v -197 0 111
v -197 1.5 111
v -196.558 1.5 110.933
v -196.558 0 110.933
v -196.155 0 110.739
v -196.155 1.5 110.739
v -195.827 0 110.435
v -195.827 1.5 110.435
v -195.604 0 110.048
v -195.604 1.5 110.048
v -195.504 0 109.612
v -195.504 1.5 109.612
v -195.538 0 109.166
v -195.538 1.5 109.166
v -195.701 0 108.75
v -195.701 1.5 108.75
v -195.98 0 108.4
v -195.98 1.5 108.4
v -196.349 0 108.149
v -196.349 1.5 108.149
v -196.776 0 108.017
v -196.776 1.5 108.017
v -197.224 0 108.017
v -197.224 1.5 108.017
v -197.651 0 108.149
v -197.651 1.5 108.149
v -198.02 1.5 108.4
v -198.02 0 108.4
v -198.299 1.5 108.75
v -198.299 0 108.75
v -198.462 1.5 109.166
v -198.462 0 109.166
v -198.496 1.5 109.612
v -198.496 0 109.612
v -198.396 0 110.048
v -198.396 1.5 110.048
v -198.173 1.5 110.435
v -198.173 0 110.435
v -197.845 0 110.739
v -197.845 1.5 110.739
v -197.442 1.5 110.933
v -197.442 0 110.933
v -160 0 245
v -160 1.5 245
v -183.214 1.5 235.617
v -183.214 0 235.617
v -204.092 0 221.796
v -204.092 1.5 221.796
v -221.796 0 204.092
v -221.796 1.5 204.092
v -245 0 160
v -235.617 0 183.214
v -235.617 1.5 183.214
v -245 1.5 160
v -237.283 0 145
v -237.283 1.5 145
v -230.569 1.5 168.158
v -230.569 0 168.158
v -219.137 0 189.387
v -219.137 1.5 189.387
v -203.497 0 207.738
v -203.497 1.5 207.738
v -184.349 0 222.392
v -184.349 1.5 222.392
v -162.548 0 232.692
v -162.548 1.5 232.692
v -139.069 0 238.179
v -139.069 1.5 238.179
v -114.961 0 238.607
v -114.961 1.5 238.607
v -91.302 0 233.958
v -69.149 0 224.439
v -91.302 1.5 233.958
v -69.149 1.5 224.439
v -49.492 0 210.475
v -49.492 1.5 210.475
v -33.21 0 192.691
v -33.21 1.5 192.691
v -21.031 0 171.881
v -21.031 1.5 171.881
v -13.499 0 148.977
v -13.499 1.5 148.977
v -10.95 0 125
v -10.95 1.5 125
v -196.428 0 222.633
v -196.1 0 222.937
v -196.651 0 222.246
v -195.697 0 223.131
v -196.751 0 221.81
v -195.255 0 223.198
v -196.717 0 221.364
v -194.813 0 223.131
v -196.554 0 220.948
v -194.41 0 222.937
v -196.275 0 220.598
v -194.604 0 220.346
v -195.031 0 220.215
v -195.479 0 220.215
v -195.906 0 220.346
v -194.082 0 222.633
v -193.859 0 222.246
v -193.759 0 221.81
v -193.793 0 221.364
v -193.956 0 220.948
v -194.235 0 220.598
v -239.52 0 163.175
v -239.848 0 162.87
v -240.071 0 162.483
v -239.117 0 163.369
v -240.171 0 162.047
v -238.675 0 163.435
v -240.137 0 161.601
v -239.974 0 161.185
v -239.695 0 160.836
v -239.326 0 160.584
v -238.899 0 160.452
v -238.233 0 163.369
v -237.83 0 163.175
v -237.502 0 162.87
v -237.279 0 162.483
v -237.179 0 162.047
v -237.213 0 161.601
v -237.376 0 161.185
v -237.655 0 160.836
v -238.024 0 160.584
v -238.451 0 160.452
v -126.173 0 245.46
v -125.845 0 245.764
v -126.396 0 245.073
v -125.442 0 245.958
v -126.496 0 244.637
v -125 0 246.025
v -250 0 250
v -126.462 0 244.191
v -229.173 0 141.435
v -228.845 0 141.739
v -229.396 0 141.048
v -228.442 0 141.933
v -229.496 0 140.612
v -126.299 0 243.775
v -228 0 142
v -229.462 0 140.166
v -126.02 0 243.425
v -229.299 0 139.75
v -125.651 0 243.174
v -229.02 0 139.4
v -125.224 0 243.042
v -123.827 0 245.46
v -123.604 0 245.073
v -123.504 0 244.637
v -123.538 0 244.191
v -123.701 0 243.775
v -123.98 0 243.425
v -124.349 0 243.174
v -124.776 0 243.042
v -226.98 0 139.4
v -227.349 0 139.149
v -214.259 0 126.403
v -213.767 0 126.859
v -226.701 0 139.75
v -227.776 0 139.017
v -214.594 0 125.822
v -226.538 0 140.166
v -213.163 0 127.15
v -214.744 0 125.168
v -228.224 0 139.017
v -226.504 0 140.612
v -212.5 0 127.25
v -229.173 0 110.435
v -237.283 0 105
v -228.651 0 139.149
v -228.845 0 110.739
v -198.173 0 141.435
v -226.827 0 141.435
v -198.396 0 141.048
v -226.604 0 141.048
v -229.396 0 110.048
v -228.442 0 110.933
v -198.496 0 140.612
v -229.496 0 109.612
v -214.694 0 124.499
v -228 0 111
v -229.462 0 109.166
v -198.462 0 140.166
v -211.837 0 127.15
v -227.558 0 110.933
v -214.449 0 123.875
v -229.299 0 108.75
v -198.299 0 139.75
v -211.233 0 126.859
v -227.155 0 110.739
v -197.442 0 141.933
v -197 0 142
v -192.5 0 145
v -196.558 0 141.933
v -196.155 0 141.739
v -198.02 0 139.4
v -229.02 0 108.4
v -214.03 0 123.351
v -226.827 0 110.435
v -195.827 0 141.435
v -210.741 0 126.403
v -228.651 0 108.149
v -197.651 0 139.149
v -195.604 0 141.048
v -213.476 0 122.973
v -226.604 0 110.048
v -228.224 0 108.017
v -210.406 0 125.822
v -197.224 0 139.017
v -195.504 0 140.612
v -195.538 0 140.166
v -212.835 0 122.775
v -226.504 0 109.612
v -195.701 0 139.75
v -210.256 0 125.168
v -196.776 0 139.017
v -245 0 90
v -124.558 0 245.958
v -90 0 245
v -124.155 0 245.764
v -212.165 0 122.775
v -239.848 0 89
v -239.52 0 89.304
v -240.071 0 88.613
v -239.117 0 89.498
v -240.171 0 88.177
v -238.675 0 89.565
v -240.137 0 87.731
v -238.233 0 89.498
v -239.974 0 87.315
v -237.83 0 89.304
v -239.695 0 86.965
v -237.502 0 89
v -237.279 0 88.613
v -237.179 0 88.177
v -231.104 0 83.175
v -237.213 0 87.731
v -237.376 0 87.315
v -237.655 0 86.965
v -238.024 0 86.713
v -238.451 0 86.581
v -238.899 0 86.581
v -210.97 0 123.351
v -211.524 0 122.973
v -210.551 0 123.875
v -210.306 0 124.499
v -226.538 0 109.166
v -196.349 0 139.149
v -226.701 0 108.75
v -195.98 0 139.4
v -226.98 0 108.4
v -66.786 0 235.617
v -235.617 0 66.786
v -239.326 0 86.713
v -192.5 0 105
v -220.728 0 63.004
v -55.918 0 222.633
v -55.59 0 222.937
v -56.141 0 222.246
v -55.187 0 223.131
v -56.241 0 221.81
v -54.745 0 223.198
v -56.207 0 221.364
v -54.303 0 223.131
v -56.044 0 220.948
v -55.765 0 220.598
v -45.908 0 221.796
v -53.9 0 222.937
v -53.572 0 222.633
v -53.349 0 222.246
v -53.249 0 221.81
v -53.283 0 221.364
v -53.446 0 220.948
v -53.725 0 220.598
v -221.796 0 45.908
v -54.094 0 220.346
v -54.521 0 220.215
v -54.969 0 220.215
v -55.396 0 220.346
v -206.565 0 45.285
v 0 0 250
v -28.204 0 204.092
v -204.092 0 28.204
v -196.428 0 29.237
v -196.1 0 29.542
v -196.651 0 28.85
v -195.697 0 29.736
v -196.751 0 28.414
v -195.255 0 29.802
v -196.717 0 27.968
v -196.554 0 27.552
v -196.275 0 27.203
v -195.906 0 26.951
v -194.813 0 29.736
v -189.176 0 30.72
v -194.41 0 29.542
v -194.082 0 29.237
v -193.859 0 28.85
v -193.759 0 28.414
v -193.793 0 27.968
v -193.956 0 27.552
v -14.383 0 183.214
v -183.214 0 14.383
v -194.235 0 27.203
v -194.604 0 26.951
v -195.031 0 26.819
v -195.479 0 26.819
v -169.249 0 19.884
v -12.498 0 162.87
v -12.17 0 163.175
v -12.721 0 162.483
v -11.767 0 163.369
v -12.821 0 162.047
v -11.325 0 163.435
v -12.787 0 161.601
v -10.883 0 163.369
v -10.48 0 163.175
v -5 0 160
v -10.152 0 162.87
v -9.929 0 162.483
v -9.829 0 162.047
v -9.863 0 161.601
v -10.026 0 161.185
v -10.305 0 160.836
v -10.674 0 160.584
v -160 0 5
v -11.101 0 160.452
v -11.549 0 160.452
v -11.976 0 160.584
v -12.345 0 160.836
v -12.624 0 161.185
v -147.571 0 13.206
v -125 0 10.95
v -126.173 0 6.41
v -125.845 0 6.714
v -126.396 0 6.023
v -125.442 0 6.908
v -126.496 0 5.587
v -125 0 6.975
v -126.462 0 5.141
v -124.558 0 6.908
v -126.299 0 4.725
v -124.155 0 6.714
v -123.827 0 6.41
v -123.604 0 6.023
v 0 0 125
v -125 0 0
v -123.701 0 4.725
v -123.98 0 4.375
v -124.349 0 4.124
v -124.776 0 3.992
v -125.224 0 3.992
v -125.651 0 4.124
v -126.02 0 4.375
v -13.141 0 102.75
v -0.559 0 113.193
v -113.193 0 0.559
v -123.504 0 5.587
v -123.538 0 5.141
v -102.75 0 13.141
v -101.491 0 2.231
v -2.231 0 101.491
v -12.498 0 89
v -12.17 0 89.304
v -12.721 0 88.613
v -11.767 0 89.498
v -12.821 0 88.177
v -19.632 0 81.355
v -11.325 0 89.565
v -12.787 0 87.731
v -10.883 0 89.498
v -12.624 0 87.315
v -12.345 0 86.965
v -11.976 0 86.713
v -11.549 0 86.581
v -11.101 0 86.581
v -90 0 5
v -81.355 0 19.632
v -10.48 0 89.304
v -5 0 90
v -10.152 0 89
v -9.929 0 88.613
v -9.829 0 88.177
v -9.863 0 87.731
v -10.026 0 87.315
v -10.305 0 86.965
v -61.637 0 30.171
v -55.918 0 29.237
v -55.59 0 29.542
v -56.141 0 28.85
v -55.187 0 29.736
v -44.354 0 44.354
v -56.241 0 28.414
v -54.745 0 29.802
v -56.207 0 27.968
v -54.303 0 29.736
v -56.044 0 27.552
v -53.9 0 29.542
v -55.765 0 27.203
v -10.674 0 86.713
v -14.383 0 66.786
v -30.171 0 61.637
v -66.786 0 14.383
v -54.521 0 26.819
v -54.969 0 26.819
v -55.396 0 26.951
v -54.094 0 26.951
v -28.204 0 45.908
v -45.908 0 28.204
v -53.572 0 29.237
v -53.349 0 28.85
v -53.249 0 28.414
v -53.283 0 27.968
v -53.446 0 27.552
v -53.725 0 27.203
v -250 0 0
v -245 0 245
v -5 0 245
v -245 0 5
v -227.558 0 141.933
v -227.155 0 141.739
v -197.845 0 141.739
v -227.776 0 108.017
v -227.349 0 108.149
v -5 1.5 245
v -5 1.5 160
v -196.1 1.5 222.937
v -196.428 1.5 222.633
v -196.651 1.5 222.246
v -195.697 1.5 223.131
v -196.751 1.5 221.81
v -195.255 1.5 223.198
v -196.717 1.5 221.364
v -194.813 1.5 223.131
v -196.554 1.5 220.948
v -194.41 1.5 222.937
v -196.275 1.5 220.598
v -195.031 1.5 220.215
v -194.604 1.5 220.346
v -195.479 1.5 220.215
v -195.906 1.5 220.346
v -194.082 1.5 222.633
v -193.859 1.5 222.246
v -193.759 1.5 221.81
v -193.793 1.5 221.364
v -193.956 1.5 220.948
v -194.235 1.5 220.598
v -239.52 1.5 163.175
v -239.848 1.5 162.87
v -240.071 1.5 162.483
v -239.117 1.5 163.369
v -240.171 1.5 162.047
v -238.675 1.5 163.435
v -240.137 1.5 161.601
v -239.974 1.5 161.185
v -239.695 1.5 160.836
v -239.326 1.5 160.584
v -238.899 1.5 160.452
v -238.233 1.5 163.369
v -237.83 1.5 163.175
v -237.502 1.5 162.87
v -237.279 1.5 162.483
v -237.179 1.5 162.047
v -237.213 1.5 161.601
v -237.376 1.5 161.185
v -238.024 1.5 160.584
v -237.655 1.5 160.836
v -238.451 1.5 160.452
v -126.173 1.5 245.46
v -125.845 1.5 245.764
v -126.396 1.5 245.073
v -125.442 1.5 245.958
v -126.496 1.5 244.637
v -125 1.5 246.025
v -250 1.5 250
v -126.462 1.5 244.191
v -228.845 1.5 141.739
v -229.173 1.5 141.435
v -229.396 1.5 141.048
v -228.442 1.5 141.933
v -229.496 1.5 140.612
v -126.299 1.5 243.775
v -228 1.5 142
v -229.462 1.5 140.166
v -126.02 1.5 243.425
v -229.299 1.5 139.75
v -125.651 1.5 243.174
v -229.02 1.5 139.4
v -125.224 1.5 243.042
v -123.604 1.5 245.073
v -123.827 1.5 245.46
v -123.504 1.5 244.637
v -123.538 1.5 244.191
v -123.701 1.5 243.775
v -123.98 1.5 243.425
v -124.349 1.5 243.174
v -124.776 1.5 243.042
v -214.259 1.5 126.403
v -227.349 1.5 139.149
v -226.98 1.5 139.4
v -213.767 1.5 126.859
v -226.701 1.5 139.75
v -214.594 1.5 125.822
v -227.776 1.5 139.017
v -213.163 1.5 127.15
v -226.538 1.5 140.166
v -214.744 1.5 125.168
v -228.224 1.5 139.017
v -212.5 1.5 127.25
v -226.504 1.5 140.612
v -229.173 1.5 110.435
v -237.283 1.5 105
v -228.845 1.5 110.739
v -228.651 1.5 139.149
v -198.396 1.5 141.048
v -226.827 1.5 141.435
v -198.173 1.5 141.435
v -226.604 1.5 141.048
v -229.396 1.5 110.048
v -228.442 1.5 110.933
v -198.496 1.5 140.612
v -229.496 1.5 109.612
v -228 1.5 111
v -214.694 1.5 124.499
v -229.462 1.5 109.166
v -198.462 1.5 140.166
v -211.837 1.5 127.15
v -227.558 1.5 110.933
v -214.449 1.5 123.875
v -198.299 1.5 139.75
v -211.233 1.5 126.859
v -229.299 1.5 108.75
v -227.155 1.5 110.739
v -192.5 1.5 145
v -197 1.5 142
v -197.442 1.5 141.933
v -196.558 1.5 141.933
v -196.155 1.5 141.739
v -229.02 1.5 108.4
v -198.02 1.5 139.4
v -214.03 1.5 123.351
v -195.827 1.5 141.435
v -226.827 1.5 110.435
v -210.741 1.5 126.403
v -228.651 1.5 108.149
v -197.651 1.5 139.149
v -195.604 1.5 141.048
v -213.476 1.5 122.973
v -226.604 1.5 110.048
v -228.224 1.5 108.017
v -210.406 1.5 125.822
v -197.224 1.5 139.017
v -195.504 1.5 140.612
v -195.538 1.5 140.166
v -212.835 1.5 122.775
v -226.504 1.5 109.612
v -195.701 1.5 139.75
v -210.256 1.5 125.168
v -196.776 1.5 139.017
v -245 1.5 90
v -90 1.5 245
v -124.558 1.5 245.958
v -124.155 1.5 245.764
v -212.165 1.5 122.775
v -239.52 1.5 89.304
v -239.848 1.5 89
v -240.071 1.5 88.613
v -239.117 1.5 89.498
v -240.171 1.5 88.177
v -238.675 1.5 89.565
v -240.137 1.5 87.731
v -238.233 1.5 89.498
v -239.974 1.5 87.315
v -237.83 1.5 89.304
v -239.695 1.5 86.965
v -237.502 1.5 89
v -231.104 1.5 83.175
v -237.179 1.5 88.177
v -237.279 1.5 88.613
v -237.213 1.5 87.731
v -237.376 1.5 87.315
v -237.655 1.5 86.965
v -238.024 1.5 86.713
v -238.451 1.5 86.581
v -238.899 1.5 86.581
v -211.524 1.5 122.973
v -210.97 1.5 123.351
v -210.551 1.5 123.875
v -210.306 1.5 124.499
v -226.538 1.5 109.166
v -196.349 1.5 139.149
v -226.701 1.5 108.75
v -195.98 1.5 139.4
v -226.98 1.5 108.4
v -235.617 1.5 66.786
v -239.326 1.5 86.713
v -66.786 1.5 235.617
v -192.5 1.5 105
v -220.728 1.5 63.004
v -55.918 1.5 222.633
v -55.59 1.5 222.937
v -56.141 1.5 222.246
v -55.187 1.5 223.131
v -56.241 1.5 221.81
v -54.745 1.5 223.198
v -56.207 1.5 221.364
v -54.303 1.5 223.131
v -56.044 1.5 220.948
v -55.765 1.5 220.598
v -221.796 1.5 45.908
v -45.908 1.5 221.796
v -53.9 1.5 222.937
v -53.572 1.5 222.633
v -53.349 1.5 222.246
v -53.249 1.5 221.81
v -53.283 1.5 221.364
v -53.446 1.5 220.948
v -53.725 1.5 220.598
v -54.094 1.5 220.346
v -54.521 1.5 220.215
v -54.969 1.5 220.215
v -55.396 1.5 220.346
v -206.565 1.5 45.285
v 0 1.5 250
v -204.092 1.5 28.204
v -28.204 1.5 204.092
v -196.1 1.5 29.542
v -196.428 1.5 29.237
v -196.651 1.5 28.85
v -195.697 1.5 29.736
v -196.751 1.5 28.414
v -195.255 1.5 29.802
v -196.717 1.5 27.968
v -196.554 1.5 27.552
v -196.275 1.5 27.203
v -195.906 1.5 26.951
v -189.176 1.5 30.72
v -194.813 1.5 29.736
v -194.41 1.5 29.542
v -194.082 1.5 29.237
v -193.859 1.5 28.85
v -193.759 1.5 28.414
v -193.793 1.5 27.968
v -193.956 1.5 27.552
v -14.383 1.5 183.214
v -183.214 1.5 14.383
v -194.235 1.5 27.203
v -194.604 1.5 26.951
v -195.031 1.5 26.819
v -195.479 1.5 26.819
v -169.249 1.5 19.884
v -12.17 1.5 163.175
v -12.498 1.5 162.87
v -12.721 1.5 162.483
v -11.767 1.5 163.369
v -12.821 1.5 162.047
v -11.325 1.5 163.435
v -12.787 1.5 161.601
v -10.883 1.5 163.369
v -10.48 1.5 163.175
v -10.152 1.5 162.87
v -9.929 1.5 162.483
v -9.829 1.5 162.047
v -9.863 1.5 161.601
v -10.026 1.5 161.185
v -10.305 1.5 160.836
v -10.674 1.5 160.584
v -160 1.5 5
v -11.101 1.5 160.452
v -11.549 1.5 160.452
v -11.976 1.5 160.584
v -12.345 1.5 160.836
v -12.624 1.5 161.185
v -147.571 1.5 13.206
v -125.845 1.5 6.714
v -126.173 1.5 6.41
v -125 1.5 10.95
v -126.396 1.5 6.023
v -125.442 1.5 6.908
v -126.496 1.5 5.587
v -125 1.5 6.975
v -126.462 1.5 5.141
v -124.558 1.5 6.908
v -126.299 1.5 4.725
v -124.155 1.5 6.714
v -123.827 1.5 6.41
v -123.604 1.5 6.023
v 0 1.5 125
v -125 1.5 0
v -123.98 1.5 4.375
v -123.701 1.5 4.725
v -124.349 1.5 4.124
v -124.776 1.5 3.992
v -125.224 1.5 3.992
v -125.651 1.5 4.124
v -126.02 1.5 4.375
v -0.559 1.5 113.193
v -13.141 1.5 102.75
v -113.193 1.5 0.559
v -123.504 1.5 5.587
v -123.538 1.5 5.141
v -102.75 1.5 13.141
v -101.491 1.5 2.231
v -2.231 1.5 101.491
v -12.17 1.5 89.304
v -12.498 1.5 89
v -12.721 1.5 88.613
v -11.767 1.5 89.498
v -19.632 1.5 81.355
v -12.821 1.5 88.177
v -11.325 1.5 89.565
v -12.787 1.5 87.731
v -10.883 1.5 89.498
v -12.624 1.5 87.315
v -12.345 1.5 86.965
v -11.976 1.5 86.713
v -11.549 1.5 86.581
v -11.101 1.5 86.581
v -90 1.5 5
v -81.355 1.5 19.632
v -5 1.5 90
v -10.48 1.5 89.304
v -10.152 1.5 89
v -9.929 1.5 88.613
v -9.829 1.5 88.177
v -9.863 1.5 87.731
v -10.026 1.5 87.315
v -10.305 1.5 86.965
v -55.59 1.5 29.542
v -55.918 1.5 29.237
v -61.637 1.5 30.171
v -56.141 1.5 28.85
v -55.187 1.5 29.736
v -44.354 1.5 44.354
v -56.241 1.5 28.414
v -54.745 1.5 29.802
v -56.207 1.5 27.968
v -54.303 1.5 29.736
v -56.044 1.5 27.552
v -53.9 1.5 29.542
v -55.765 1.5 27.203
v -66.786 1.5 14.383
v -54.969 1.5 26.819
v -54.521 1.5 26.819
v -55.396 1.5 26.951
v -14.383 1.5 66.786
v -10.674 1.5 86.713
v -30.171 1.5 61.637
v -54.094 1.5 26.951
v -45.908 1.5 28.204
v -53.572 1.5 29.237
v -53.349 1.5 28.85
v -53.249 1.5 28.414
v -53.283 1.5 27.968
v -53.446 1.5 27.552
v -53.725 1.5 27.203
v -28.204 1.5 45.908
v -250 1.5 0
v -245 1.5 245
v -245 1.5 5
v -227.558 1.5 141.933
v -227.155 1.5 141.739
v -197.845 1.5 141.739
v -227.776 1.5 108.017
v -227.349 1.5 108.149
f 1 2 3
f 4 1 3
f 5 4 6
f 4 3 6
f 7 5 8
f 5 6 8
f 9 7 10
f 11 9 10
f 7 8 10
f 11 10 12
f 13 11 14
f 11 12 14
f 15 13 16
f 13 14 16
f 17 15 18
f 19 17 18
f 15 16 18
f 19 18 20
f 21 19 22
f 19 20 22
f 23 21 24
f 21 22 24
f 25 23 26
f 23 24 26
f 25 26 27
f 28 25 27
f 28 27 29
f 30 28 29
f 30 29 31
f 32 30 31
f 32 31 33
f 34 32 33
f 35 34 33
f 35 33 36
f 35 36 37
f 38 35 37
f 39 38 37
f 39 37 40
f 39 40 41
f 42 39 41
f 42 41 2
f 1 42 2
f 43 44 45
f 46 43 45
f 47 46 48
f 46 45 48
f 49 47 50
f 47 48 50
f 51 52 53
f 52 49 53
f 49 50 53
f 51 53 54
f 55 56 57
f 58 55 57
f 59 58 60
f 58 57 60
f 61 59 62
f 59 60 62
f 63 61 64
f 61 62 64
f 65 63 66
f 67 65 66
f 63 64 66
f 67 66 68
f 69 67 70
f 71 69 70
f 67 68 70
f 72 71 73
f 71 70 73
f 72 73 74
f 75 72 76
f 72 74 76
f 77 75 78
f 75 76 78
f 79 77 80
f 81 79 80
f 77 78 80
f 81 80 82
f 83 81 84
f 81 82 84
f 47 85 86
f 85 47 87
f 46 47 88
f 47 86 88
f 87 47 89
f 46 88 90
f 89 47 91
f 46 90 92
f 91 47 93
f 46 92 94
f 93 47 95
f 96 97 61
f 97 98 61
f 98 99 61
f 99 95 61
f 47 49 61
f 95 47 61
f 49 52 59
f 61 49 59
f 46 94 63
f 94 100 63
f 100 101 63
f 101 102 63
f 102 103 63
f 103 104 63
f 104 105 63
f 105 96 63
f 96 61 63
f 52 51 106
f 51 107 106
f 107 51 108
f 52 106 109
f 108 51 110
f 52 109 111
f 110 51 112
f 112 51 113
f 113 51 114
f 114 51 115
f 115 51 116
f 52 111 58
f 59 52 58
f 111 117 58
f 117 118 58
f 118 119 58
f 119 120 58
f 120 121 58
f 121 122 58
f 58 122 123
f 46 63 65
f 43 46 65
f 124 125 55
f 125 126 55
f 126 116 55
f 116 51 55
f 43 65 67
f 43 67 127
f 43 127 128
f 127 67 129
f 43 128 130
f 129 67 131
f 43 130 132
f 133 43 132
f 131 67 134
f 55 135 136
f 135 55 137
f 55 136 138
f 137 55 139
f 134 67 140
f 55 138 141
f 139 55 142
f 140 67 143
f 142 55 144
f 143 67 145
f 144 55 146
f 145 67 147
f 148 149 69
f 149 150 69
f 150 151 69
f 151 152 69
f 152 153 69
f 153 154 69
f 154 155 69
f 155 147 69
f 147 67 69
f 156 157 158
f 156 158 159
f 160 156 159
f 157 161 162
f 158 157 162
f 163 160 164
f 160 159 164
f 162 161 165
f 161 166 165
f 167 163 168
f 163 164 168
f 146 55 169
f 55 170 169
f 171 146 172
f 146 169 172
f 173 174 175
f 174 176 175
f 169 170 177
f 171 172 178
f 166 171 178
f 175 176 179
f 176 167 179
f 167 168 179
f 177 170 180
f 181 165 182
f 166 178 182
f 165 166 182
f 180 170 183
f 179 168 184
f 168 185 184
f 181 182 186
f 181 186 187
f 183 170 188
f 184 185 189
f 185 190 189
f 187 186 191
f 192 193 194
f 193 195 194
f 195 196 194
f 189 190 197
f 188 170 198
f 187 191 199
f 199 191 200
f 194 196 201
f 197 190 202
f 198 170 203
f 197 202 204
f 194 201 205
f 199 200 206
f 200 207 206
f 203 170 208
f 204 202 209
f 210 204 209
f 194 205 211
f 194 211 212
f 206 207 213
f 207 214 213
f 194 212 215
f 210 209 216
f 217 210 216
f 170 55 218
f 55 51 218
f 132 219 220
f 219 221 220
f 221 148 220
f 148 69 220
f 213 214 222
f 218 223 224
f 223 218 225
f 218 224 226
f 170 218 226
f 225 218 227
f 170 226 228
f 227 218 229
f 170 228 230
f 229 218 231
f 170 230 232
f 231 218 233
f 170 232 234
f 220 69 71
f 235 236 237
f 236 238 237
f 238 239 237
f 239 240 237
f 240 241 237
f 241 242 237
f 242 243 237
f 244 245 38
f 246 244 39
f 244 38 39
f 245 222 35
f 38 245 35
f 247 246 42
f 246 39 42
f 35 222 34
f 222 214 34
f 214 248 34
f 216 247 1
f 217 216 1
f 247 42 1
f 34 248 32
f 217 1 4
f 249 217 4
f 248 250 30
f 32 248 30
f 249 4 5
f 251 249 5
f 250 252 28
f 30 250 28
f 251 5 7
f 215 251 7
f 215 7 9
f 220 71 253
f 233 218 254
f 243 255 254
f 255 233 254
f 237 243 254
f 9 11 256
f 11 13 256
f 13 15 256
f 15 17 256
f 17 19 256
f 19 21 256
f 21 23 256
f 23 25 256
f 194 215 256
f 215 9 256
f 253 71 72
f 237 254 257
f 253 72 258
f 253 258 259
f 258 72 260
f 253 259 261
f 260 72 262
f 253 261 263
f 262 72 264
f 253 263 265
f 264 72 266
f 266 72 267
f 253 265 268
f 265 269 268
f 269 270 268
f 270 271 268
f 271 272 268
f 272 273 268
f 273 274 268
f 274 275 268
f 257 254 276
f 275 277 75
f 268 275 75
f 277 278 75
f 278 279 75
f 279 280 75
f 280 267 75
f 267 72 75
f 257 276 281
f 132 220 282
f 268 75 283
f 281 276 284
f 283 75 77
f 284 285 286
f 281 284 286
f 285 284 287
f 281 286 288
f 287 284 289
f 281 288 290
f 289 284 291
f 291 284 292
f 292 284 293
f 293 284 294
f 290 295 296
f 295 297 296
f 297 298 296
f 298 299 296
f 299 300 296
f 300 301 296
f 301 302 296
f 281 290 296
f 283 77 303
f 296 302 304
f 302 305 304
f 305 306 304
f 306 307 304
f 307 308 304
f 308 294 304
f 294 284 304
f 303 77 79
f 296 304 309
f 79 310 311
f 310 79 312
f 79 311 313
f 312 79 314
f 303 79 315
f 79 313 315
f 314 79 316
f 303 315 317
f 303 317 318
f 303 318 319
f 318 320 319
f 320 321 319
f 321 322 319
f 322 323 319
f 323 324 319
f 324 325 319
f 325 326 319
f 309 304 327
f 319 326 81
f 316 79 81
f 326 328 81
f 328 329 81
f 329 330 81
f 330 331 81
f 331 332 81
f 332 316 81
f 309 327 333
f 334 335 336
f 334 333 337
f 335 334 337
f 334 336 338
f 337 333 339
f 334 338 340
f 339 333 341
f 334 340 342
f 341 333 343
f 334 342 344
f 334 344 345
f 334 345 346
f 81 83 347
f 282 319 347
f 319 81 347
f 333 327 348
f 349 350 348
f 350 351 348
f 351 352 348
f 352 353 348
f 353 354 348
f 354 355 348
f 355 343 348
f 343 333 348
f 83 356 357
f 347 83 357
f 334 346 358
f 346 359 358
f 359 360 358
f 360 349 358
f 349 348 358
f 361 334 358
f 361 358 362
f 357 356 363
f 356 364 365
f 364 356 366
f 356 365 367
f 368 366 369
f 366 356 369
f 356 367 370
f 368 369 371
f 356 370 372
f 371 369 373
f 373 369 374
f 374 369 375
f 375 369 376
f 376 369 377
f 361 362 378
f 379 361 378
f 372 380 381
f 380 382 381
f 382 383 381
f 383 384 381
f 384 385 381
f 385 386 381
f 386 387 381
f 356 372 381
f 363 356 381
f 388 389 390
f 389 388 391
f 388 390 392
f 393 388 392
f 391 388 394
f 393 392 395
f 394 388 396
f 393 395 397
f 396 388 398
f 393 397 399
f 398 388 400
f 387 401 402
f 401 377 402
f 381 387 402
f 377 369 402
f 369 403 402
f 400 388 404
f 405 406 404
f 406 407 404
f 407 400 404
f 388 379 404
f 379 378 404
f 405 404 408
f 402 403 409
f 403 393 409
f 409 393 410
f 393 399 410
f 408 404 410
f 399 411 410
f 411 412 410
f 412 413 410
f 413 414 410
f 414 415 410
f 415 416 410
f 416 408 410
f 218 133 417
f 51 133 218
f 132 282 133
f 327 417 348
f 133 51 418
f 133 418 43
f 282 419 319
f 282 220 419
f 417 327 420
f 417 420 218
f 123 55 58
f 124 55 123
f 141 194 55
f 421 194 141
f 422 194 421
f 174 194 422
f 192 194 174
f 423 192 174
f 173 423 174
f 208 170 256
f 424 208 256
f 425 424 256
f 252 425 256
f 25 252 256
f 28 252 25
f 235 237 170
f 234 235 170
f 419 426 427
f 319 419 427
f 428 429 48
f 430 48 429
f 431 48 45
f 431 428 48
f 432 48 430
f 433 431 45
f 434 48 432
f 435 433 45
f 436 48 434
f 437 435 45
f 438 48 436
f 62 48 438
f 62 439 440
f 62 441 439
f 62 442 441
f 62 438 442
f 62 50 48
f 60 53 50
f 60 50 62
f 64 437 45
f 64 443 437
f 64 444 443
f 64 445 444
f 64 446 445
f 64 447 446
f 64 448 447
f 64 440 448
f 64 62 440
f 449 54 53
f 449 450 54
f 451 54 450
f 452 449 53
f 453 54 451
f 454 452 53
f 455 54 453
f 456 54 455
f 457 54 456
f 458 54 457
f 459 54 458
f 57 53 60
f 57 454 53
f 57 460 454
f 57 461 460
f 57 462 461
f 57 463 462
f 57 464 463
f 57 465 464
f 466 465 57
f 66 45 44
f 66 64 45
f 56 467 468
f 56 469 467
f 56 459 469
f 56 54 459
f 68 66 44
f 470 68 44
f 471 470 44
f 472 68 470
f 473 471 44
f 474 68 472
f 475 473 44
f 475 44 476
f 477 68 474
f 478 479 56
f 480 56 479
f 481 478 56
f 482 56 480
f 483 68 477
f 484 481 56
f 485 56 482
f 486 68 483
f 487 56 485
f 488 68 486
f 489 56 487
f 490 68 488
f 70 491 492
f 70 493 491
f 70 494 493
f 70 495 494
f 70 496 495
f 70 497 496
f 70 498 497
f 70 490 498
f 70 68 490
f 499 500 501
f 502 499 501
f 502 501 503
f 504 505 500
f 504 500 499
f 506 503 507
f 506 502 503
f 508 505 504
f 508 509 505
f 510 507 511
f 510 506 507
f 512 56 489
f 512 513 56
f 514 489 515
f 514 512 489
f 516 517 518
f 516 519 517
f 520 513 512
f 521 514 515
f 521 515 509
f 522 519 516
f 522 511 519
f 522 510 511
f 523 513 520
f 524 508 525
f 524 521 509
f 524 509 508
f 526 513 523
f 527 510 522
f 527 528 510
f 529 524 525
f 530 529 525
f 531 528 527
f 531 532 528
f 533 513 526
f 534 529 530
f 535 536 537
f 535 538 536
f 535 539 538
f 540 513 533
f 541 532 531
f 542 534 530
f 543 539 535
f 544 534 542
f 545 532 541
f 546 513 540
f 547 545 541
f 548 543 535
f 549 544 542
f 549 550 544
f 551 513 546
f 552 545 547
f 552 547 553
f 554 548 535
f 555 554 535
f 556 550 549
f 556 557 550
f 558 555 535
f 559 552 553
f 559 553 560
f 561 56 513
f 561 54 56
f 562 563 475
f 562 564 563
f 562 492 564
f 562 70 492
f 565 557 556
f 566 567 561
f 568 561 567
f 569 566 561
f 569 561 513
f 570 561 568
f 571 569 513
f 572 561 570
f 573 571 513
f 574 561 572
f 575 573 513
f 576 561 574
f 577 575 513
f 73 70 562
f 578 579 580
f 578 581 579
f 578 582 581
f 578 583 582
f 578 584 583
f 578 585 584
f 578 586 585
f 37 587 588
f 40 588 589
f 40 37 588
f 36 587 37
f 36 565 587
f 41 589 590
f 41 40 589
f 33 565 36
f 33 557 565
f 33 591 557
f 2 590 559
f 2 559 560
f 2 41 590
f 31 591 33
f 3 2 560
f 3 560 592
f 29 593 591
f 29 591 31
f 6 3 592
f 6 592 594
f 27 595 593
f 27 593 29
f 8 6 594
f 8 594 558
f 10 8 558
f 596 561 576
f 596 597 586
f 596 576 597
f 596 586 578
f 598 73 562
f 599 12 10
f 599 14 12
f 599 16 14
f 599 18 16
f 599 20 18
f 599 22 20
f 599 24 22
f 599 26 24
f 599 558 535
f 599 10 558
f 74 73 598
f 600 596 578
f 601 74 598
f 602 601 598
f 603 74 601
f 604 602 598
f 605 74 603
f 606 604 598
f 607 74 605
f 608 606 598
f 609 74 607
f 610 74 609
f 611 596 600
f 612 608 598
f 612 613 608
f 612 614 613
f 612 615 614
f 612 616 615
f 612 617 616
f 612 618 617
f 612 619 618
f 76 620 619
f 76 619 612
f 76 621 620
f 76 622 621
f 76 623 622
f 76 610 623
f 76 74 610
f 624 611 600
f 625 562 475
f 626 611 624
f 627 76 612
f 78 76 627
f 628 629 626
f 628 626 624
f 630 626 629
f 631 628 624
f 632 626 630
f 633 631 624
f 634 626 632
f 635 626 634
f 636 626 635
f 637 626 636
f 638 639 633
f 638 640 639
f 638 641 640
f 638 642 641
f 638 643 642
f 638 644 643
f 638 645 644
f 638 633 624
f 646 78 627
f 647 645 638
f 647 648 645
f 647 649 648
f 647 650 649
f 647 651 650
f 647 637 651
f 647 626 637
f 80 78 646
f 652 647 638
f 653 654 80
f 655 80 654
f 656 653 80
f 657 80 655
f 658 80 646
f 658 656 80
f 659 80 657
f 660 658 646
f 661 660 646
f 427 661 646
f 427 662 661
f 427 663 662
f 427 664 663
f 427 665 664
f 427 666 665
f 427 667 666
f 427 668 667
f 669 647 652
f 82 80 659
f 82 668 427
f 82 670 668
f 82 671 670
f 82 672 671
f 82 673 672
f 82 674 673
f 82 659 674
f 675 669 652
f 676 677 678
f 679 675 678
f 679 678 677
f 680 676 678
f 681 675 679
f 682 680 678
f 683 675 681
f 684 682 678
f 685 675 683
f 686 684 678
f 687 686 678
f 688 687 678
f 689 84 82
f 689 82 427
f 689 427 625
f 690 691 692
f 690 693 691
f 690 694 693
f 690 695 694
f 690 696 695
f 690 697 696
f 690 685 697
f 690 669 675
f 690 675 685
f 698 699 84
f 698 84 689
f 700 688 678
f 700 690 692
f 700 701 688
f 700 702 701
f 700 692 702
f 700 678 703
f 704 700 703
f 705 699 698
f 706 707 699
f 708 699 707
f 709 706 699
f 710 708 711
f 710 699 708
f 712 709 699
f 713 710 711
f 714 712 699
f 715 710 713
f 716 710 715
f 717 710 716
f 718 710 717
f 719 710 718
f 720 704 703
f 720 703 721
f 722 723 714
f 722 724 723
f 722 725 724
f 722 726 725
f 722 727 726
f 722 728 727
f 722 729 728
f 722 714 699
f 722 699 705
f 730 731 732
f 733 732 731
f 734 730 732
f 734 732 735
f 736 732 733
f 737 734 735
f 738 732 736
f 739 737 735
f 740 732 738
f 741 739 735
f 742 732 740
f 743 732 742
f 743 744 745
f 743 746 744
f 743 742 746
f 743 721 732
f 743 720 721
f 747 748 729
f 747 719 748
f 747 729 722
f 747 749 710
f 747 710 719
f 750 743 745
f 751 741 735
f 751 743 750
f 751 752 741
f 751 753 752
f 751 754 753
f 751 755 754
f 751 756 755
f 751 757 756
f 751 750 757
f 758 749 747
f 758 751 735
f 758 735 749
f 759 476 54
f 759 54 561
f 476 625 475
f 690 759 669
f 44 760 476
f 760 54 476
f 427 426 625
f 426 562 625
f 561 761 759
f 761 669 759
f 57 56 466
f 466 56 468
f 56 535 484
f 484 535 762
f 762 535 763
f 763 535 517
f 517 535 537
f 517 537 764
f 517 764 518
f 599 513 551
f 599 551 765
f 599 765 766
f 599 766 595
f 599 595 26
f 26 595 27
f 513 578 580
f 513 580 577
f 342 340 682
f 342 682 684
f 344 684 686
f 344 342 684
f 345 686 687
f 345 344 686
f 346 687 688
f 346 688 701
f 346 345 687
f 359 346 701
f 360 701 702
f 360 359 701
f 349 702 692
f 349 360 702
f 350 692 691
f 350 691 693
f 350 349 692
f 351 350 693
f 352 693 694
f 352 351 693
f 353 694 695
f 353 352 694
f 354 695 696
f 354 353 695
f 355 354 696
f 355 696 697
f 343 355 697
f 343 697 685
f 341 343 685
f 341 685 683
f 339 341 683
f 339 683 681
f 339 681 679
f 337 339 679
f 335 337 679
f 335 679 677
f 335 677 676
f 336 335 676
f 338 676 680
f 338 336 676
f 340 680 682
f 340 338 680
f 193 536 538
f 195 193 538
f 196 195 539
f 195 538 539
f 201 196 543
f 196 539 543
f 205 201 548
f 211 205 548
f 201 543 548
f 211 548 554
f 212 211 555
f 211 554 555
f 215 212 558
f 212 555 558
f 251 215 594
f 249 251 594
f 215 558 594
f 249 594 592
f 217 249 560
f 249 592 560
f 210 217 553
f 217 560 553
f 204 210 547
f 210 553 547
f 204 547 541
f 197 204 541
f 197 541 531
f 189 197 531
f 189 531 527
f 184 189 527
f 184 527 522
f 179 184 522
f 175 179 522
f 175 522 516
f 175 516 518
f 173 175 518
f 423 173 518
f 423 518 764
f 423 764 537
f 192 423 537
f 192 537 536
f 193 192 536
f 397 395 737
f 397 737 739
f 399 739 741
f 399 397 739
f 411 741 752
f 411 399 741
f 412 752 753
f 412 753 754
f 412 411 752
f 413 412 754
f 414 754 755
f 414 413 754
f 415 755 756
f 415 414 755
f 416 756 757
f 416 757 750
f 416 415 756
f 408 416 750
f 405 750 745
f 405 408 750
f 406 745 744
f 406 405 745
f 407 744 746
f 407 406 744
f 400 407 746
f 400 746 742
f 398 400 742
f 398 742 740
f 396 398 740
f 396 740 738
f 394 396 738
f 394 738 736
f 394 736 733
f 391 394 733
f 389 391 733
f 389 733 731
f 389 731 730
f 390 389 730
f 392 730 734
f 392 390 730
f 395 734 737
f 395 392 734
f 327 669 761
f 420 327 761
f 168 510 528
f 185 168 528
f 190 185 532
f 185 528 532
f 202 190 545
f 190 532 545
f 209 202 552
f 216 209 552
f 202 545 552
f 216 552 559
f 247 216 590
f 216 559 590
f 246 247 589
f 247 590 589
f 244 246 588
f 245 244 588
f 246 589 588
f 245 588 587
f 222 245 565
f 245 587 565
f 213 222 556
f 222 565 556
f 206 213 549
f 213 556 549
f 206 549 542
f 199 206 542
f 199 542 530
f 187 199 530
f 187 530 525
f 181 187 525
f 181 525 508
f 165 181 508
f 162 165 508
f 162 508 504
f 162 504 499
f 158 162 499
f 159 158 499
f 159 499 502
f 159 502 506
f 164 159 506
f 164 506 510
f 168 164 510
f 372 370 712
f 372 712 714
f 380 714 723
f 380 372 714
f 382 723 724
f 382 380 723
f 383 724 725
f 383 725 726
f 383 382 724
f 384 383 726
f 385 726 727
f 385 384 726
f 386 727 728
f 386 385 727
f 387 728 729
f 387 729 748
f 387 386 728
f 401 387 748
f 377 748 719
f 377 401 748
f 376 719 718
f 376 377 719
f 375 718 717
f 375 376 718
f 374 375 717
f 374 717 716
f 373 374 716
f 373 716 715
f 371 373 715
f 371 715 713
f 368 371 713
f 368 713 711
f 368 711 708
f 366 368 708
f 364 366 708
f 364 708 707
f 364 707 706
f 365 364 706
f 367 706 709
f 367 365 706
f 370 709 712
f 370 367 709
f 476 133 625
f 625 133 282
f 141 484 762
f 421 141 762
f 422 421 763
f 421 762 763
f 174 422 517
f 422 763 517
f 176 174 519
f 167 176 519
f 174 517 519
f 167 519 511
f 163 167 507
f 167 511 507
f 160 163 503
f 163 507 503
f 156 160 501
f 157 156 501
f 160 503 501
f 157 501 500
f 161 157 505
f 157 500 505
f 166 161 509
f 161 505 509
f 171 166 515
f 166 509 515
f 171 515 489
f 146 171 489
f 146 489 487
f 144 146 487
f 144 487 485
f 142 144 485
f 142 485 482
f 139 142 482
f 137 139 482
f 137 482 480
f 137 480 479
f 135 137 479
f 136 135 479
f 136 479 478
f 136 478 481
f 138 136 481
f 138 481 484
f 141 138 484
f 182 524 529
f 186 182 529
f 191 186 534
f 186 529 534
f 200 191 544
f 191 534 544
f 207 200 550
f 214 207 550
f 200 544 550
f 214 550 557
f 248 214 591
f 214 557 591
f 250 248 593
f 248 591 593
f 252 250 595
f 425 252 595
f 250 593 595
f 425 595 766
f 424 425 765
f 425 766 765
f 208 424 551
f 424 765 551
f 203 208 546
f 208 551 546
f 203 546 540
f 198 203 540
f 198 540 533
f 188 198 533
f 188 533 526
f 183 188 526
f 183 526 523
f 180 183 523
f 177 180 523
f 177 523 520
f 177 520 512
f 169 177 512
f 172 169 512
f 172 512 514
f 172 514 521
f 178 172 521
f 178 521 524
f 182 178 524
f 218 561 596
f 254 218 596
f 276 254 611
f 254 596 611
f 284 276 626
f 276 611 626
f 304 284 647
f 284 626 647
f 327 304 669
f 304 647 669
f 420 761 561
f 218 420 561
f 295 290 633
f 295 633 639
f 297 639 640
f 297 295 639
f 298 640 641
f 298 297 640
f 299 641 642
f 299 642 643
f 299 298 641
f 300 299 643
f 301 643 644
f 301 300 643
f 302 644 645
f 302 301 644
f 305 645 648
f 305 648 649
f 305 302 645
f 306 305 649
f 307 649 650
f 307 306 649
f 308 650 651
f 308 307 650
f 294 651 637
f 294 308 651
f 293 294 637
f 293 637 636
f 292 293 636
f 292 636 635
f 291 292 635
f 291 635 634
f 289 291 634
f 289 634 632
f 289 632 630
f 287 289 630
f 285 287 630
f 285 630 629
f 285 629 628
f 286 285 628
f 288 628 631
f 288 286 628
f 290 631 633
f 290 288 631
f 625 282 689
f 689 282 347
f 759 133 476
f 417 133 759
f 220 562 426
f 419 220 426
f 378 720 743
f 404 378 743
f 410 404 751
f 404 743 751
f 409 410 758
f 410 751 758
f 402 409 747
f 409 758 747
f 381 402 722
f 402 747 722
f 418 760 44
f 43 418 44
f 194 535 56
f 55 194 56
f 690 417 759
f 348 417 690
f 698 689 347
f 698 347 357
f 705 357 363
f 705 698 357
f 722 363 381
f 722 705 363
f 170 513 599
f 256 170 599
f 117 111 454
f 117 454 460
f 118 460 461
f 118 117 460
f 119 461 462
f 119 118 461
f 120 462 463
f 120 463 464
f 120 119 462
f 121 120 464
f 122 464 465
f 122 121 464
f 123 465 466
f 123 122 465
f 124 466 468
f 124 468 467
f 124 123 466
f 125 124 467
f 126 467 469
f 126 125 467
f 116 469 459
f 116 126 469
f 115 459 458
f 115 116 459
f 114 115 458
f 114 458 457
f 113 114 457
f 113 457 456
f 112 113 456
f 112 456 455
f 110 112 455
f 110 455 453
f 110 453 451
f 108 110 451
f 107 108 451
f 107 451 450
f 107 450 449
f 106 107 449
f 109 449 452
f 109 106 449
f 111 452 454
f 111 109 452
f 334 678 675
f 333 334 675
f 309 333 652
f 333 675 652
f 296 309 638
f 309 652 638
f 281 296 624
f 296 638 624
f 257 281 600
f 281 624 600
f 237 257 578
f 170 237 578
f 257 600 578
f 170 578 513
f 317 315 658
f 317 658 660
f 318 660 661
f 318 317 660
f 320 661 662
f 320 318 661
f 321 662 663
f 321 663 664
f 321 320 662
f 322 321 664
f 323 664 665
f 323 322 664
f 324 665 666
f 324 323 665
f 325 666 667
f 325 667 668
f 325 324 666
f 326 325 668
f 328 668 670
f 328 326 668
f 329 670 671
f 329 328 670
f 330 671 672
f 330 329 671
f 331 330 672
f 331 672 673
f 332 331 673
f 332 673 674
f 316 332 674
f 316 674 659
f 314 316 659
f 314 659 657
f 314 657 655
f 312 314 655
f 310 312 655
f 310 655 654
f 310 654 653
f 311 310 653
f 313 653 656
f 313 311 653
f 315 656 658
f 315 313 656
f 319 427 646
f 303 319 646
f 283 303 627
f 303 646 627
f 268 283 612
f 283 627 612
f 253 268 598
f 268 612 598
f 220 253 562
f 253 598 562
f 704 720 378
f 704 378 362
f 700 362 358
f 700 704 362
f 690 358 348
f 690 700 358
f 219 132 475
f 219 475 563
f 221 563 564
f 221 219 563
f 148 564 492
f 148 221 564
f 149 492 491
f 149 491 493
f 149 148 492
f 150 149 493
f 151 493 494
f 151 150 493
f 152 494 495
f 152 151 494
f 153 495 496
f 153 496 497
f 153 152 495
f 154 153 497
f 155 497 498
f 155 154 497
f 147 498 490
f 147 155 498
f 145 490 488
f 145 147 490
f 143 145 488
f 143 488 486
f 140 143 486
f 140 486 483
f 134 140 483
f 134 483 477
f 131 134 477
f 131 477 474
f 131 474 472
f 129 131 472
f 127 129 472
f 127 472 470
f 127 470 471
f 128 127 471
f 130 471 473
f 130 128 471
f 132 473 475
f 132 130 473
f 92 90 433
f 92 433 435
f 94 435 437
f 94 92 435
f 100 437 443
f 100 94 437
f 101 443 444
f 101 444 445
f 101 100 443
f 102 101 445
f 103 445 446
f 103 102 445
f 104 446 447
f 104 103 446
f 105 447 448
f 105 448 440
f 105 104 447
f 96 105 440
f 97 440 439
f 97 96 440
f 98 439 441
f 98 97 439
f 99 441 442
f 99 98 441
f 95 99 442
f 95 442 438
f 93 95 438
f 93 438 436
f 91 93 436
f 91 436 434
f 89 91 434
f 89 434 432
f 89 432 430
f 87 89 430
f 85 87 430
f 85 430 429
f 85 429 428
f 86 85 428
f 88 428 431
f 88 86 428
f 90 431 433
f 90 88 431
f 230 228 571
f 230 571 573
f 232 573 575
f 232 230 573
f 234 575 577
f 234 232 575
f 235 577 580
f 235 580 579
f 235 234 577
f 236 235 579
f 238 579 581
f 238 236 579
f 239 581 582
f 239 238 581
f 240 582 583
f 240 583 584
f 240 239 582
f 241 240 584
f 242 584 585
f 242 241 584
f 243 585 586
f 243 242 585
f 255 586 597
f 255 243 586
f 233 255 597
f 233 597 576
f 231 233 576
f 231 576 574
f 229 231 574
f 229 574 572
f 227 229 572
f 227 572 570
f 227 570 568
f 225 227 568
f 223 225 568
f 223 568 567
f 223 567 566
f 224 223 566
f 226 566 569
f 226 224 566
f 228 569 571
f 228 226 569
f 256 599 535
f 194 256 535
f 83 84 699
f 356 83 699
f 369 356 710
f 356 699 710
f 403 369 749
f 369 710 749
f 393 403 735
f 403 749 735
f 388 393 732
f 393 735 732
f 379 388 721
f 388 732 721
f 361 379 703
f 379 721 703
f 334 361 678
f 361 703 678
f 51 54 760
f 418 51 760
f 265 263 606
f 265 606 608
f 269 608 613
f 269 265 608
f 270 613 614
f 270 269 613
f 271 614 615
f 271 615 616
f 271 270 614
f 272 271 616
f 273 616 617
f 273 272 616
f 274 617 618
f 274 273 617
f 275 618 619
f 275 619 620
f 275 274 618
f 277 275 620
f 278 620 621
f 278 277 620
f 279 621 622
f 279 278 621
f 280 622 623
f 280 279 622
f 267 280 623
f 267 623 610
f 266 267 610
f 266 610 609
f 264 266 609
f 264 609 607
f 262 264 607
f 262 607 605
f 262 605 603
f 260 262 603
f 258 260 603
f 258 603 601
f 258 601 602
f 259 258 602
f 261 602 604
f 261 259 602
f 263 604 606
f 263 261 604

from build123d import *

# Parameters (mm, degrees)
SKETCH1_W           = 250
SKETCH1_H           = 250
SKETCH1_R           = 1.5
BOSS_EXTRUDE1_DEPTH = 1.5
SKETCH2_R           = 2.25
SKETCH2_R_2         = 1.5
CUT_EXTRUDE1_DEPTH  = 2
CUT_EXTRUDE2_DEPTH  = 2
CUT_EXTRUDE3_DEPTH  = 2


with BuildPart() as part:
    # Sketch1 → Boss-Extrude1 (new body)
    with BuildSketch(Plane(origin=(0, 0, 0), x_dir=(1, 0, 0), z_dir=(0, 1, 0))):
        with Locations((-125, -125)):
            Rectangle(SKETCH1_W, SKETCH1_H)
        with Locations(Location((-125, -5.475, 0), (0, 0, 270))):
            Circle(SKETCH1_R, mode=Mode.SUBTRACT)
        with Locations(Location((-11.32496989, -88.064743747, 0), (0, 0, 270))):
            Circle(SKETCH1_R, mode=Mode.SUBTRACT)
        with Locations(Location((-54.74496772, -28.302243747, 0), (0, 0, 270))):
            Circle(SKETCH1_R, mode=Mode.SUBTRACT)
        with Locations(Location((-11.32496989, -161.935256253, 0), (0, 0, 270))):
            Circle(SKETCH1_R, mode=Mode.SUBTRACT)
        with Locations(Location((-54.74496772, -221.697756253, 0), (0, 0, 269.999999999))):
            Circle(SKETCH1_R, mode=Mode.SUBTRACT)
        with Locations(Location((-125, -244.525, 0), (0, 0, 270))):
            Circle(SKETCH1_R, mode=Mode.SUBTRACT)
        with Locations(Location((-195.25503228, -221.697756253, 0), (0, 0, 269.999999999))):
            Circle(SKETCH1_R, mode=Mode.SUBTRACT)
        with Locations(Location((-238.67503011, -161.935256253, 0), (0, 0, 270))):
            Circle(SKETCH1_R, mode=Mode.SUBTRACT)
        with Locations(Location((-238.67503011, -88.064743747, 0), (0, 0, 270))):
            Circle(SKETCH1_R, mode=Mode.SUBTRACT)
        with Locations(Location((-195.25503228, -28.302243747, 0), (0, 0, 270))):
            Circle(SKETCH1_R, mode=Mode.SUBTRACT)
    extrude(amount=BOSS_EXTRUDE1_DEPTH)

    # Sketch2 → Cut-Extrude1 (cut)
    with BuildSketch(Plane(origin=(0, 1.5, 0), x_dir=(1, 0, 0), z_dir=(0, 1, 0))):
        with Locations(Location((-212.5, -125, 0), (0, 0, 270))):
            Circle(SKETCH2_R)
        with Locations(Location((-228, -140.5, 0), (0, 0, 270))):
            Circle(SKETCH2_R_2)
        with Locations(Location((-228, -109.5, 0), (0, 0, 270))):
            Circle(SKETCH2_R_2)
        with Locations(Location((-197, -109.5, 0), (0, 0, 270))):
            Circle(SKETCH2_R_2)
        with Locations(Location((-197, -140.5, 0), (0, 0, 270))):
            Circle(SKETCH2_R_2)
    extrude(amount=-CUT_EXTRUDE1_DEPTH, mode=Mode.SUBTRACT)

    # Sketch3 → Cut-Extrude2 (cut)
    with BuildSketch(Plane(origin=(0, 1.5, 0), x_dir=(1, 0, 0), z_dir=(0, 1, 0))):
        with BuildLine():
            ThreePointArc((-245, -90), (-213.388347648, -36.611652352), (-160, -5))
            Line((-160, -5), (-245, -5))
            Line((-245, -5), (-245, -90))
        make_face()
        with BuildLine():
            ThreePointArc((-160, -245), (-213.388347648, -213.388347648), (-245, -160))
            Line((-245, -160), (-245, -245))
            Line((-245, -245), (-160, -245))
        make_face()
        with BuildLine():
            Line((-5, -245), (-5, -160))
            ThreePointArc((-5, -160), (-36.611652352, -213.388347648), (-90, -245))
            Line((-90, -245), (-5, -245))
        make_face()
        with BuildLine():
            Line((-5, -5), (-90, -5))
            ThreePointArc((-90, -5), (-36.611652352, -36.611652352), (-5, -90))
            Line((-5, -90), (-5, -5))
        make_face()
        with BuildLine():
            ThreePointArc((-10.95, -125), (-44.354471606, -44.354471606), (-125, -10.95))
            ThreePointArc((-125, -10.95), (-198.233880479, -37.568877109), (-237.282690117, -105))
            Line((-237.282690117, -105), (-232.5, -105))
            Line((-232.5, -105), (-192.5, -105))
            Line((-192.5, -105), (-192.5, -145))
            Line((-192.5, -145), (-232.5, -145))
            Line((-232.5, -145), (-237.282690117, -145))
            ThreePointArc((-237.282690117, -145), (-114.961033616, -238.607313382), (-10.95, -125))
        make_face()
    extrude(amount=-CUT_EXTRUDE2_DEPTH, mode=Mode.SUBTRACT)

    # Sketch4 → Cut-Extrude3 (cut)
    with BuildSketch(Plane(origin=(0, 1.5, 0), x_dir=(1, 0, 0), z_dir=(0, 1, 0))):
        with BuildLine():
            Line((-125, 0), (0, 0))
            Line((0, 0), (0, -125))
            ThreePointArc((0, -125), (-36.611652352, -36.611652352), (-125, 0))
        make_face()
    extrude(amount=-CUT_EXTRUDE3_DEPTH, mode=Mode.SUBTRACT)


solid = part.part
